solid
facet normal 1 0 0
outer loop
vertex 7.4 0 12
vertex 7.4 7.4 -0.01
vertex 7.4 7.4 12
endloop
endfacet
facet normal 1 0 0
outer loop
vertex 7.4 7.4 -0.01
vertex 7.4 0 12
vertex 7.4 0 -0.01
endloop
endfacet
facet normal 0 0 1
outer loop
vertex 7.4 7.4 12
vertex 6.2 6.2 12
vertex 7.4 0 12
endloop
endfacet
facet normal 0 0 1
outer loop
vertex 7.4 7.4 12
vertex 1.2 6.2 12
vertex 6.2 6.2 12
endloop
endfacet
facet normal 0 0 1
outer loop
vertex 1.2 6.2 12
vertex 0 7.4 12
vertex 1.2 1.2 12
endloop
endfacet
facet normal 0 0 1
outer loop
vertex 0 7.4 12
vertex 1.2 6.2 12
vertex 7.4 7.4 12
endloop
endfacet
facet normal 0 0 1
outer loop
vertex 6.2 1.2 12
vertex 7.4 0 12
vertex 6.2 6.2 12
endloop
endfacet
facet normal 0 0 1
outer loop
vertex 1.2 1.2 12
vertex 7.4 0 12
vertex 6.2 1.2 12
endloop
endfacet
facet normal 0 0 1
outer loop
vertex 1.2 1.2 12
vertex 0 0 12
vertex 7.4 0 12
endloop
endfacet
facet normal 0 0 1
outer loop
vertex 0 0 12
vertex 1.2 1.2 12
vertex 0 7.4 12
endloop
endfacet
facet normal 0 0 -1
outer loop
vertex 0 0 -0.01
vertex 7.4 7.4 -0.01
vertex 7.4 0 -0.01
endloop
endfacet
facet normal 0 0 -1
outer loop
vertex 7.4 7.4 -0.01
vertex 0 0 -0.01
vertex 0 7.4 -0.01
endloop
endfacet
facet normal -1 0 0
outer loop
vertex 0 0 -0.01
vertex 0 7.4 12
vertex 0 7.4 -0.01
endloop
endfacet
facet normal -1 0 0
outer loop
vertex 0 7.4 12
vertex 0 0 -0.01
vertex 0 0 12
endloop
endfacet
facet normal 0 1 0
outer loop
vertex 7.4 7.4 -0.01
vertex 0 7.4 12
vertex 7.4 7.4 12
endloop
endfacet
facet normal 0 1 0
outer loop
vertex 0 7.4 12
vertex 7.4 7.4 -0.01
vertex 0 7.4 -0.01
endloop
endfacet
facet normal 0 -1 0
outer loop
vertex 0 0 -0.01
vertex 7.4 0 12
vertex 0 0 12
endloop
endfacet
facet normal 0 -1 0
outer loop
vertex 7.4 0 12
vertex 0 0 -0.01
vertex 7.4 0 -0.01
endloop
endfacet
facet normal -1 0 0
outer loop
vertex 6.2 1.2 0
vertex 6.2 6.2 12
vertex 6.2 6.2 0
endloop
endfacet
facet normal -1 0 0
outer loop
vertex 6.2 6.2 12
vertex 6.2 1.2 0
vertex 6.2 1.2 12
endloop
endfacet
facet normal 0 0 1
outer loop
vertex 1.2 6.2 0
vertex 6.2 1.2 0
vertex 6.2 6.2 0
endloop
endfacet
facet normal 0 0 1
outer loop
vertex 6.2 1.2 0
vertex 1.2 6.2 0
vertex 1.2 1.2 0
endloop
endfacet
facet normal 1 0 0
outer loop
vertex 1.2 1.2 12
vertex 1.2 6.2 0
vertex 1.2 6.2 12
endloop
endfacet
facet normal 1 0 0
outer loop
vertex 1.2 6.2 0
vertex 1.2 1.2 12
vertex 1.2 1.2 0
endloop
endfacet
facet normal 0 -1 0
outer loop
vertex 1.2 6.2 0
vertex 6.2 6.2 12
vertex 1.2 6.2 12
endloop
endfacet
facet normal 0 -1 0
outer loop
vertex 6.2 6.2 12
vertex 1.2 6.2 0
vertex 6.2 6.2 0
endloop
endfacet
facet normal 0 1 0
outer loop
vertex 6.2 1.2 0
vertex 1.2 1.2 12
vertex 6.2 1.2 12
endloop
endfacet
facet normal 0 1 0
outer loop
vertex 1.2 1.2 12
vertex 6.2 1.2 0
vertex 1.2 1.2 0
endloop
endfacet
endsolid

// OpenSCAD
// file: ../Base/Rotation.scad
// Fischertechnik Box Foundation
// Geometry Helpers Rotation

include <PlacementOptions.scad>

// getRotatedSpace(space, rotation=NoRotation)
// Rotates the space dependent on the specified rotation

function getRotatedSpace(space, rotation=NoRotation) = [
    (rotation == Rotate90 || rotation == Rotate270) ? space.y : space.x,
    (rotation == Rotate90 || rotation == Rotate270) ? space.x : space.y
];

// Rotates the given space around the fixed left lower corner
// space = the space the children needs as width/depth list [width,depth]
// rotation = 0 Rotate0 degrees, 1 Rotate90 degrees, 2 Rotate180 degrees, 3 Rotate270 degrees (equivalent to -90)

module RotateFix(space, rotation=NoRotation) {
    dy = (rotation == Rotate0 || rotation == Rotate270) ? 0 :
        (rotation == Rotate90) ? space.x :
        space.y;
    dx = (rotation < Rotate180) ? 0 :
        (rotation == Rotate180) ? space.x :
        space.y;
    
    translate([dx, dy, 0])
        rotate([0, 0, rotations[rotation]])
            children();
}
// file: ../Base/Alignment.scad
// Fischertechnik Box Foundation
// Geometry Helpers Alignment

include <PlacementOptions.scad>

// getAlignedX(elementWidth, spaceWidth, align=AlignRight, offset=0)
// Gets the aligned X offset of an element with the given
// width in the given space.
// elementWidth = The width of the element to positon
// spaceWidth = The space where the element should be aligned
// align = 0 AlignLeft, 1 AlignCenter, 2 AlignRight
// offset = an optional offset from the aligned position. When
// aligned left or centered, then positive values are in X direction.
// When aligned right then positive values are in negative X direction.

function getAlignedX(elementWidth, spaceWidth, align=AlignRight, offset=0) =
    (align == AlignLeft) ?
        offset :
        ((align == AlignCenter) ?
        (spaceWidth - elementWidth)/2 + offset :
        spaceWidth - offset - elementWidth);

// getAlignedY(elementDepth, spaceDepth, align=AlignTop, offset=0)
// Gets the aligned Y offset of an element with the given
// depth in the given space.
// elementDepth = The depth of the element to positon
// spaceDepth = The space where the element should be aligned
// align = 0 AlignBottom, 1 AlignCenter, 2 AlignTop
// offset = an optional offset from the aligned position. When
// aligned bottom or centered, then positive values are in Y direction.
// When aligned top then positive values are in negative Y direction.

function getAlignedY(elementDepth, spaceDepth, align=AlignTop, offset=0) =
    (align == AlignBottom) ?
        offset :
        ((align == AlignCenter) ?
        (spaceDepth - elementDepth)/2 + offset :
        spaceDepth - offset - elementDepth);
// file: ../Base/PlacementOptions.scad
// Fischertechnik Box Foundation
// Placement Options

// Alignment
NoAlign = 0;
AlignLeft = 1;
AlignBottom = 2;
AlignCenter = 3;
AlignRight = 4;
AlignTop = 5;

// Element rotation degree steps
rotations = [0, -90, -180, -270];

// Rotation
NoRotation = 0;
Rotate0 = 0;
Rotate90 = 1;
Rotate180 = 2;
Rotate270 = 3;

// Docking (seen from above)
NoDock = -1;
DockLeft = 0;
DockTop = 1;
DockRight = 2;
DockCorner = 2;
DockBottom = 3;

// Web corners
LowerLeft = 0;
UpperLeft = 1;
UpperRight = 2;
LowerRight = 3;

// Web position relative to corner
LeftOfCorner = 0;
RightOfCorner = 1;
// file: ../Base/Boxes.scad
// Fischertechnik Box Foundation
// Pre-designed Boxes

use <Constants.scad>

include <PlacementOptions.scad>

box190Width = 190;
box190Depth = 130;
box130Width = 130;
box130Depth = 95;

// Values are from an original ec3 box
topBottomDifference = 1.5;
outerHeight = 40;
baseThickness = 1.8;
innerHeight = outerHeight - baseThickness;
stackExcess = 5.7;
radius = 3.5;
wallThickness = 1.5;
tolerance = 0.2;

boxWallThickness = wallThickness;
boxBaseThickness = baseThickness;
boxWebWidth = 3.0;

// getBoxWallThickness()
// Gets the wall thickness of a Fischertechnik Box
function getBoxWallThickness() = boxWallThickness;

// getBoxUsageHeight(height = 38.2)
// Gets the usable height of a Fischertechnik box
// height = Outer height of the box from the bottom to the upper edge.
function getBoxUsageHeight(height = outerHeight) = height - baseThickness - stackExcess;

// getBoxInnerHeight()
// Gets the inner height of a Fischertechnik box, including the stack excess
function getBoxInnerHeight() = innerHeight;

// getBoxBaseThickness()
// Gets the thickness of the Fischertechnik box base.
function getBoxBaseThickness() = boxBaseThickness;

// getBoxWebWidth()
// Gets the width of a box web
function getBoxWebWidth() = boxWebWidth;

// getBox190Space()
// Gets the usable inner space of a Box 190 as an x/y-list
function getBox190Space() = [
    box190Width - 2*getBoxWallThickness() - topBottomDifference, 
    box190Depth - 2*getBoxWallThickness() - topBottomDifference ];

// RoundedCornerPlate(width, depth, height, radius)
// Creates a body plate with rounded corners for a box. Used
// also to create the complete box with the hull module.
// width = Width of the plate
// depth = depth of the plate 
// height = thickness of the plate
// radius = radius of the rounded corner
module RoundedCornerPlate(width, depth, height, radius) {
    translate([radius, radius])
    hull() {
        w = width-2*radius;
        d = depth-2*radius;
        cube([w, d, height]);
        cylinder(height, r=radius, $fn=getFragments());
        translate([w, 0])
            cylinder(height, r=radius, $fn=getFragments());
        translate([w, d])
            cylinder(height, r=radius, $fn=getFragments());
        translate([0, d])
            cylinder(height, r=radius, $fn=getFragments());
    }
}

// BoxBase(width, depth)
// Creates an empty stackable Fischertechnik compatible box
// width = Outer width of the box (190, 130, ...)
// depth = Outer depth of the box (130, 95, ...)

module BoxBase(width, depth, height=outerHeight) {    
    thinPlate = 0.01;

    innerHeight = height - baseThickness;    
    
    module Body(tolerance=tolerance) {
        hull() {
            // Bottom with tolerance to fit into the original boxes when stacked
            translate([-wallThickness+tolerance, -wallThickness+tolerance, -baseThickness])
                RoundedCornerPlate(width-topBottomDifference-2*tolerance, depth-topBottomDifference-2*tolerance, thinPlate, radius);
            
            // Top
            translate([-wallThickness-topBottomDifference/2, -wallThickness-topBottomDifference/2, innerHeight-thinPlate])
                RoundedCornerPlate(width, depth, thinPlate, radius);
         }
    }

    module Cutoff() {
        hull() {
            coWidth = width - 2*wallThickness;
            coDepth = depth - 2*wallThickness;
            
            // Bottom
            RoundedCornerPlate(coWidth-topBottomDifference, coDepth-topBottomDifference, thinPlate, radius);

            // Top
            translate([-topBottomDifference/2, -topBottomDifference/2, innerHeight+thinPlate]) 
                RoundedCornerPlate(coWidth, coDepth, thinPlate, radius);
        }
    }
    
    difference() {        
        Body();
        Cutoff();
        stackOffset = innerHeight - stackExcess;
        translate([0, 0, stackOffset + baseThickness])
            Body(tolerance=0);
    }
}

// Creates the Fischertechnik empty box 130x190 mm and places it at position 0,0
// 190x130 are the outer sizes, the inner space is slightly smaller. Use getBox190Space() to get the inner sizes.
// The box is positioned that the usable inner space is at the 0,0,0 position.

module Box190() {
    BoxBase(box190Width, box190Depth);
}

// Gets the usable inner space of a Box 130 as an x/y-list
function getBox130Space() = [
    box130Width - 2*getBoxWallThickness() - topBottomDifference, 
    box130Depth - 2*getBoxWallThickness() - topBottomDifference ];

// Creates the Fischertechnik empty box 95x130 mm and places it at position 0,0
// 190x130 are the outer sizes, the inner space is slightly smaller. Use getBox190Space() to get the inner sizes.
// The box is positioned that the usable inner space is at the 0,0,0 position.

module Box130() {
    BoxBase(box130Width, box130Depth);
}

// Creates a web at the specified box walls
// corner 0 = LowerLeft, 1 = UpperLeft, 2 = UpperRight, 3 = LowerRight
// side 0 = LeftOfCorner, 1 = RightOfCorner
// distance = Distance in mm from the corner
// boxSpace = inner width and depth of the box (default: Box 190)
// webWidth = length of the web (default is 3 mms)
// webThickness = thickness of the web (default is 1 mm)
// height = Height of the web (standard is getBoxUsageHeight())
// sink = How much of the web is sunk into the wall

module BoxWeb(
    corner, 
    side, 
    distance, 
    boxSpace=getBox190Space(), 
    webWidth=getBoxWebWidth(), 
    webThickness=1.0, 
    height=getBoxUsageHeight(),
    sink = getBoxWallThickness()/2) {
    width = (corner % 2 == 0) ? 
            (side == LeftOfCorner ? webWidth : webThickness) :
            (side == LeftOfCorner ? webThickness : webWidth);

    depth = (corner % 2 == 0) ? 
            (side == RightOfCorner ? webWidth : webThickness) :
            (side == RightOfCorner ? webThickness : webWidth);
    
    xDiff = corner == LowerLeft ? 
                (side == LeftOfCorner ? -sink : distance) :
            (corner == UpperLeft ?                
                (side == LeftOfCorner ? distance : -sink) :
            (corner == UpperRight ?
                (side == LeftOfCorner ? boxSpace.x-webWidth+sink : boxSpace.x-distance-webThickness) :
                (side == LeftOfCorner ? boxSpace.x-distance-webThickness: boxSpace.x-webWidth+sink)));

    yDiff = corner == LowerLeft ? 
                (side == RightOfCorner ? -sink : distance) :
            (corner == UpperLeft ?
                (side == RightOfCorner ? boxSpace.y-distance-webThickness : boxSpace.y-webWidth+sink) :
            (corner == UpperRight ?
                (side == RightOfCorner ? boxSpace.y-webWidth+sink : boxSpace.y-distance-webThickness) :
                (side == RightOfCorner ? distance : -sink)));
    
    translate([xDiff, yDiff, -getExcess()])
        cube([width, depth, height + 2*getExcess()]);
}
// file: ../Base/Placement.scad
// Fischertechnik Box Foundation
// Geometry Helpers Placement

use <Constants.scad>
use <Alignment.scad>
use <Rotation.scad>
use <Boxes.scad>

include <PlacementOptions.scad>

// Place(x=0, y=0, elementSpace=[0,0], alignX=AlignLeft, alignY=AlignBottom, rotation=Rotate0, boxSpace=getBox190Space())
// Places the child at the specified position
// y = Y-Position. This is a relative position when an X aligment is specified.
// x = X-Position. This is a relative position when an Y aligment is specified.
// elementSpace = space of the element to be placed [x,y]
// alignX = -1=NoAlign, 0 AlignLeft, 1 AlignCenter, 3 AlignRight (elementSpace and boxSpace required!)
// alignY = -1=NoAlign, 2 AlignBottom, 1 AlignCenter, 4 AlignTop (elementSpace and boxSpace required!)
// rotation = 0 Rotate0 0 degrees, 1 Rotate90 90 degrees, 
// 2 Rotate180 180 degrees, 3 Rotate270 270 degrees (equivalent to -90)
// boxSpace = Inner space of the box where the placement occurs [x,y] - default is Box 190x130 inner space

module Place(x=0, y=0, elementSpace=[0,0], 
  alignX=AlignLeft, alignY=AlignBottom, 
  rotation=NoRotation, boxSpace=getBox190Space()) {

    module Position(x, y, space, rotation=Rotate0) {
        translate([x, y, 0])
            RotateFix(space, rotation)
                children();
    }

    space = getRotatedSpace(elementSpace, rotation);
    alignedX = getAlignedX(space.x, boxSpace.x, alignX, x);
    alignedY = getAlignedY(space.y, boxSpace.y, alignY, y);
    Position(alignedX, alignedY, elementSpace, rotation)
        children();
}

// Center(space=getBox130Space(), elementSpace=[0,0])
// space = Space where the children is centered. For cylinder use centered=true and no elementSpace.
// elementSpace = space of the element to be centered [x,y]

module Center(space=getBox190Space(), elementSpace=[0,0]) {
    Place(elementSpace=elementSpace, boxSpace=space, alignX=AlignCenter, alignY=AlignCenter)
        children();
}

// CenterHorizontal(width=0, y=0, offset=0, space=getBox130Space())
// width = Width of the element to be placed.
// y = Y position of the element
// offset = Offset from the center position (negative will be left of the center)
// space = Space where the element is placed

module CenterHorizontal(width=0, y=0, offset=0, space=getBox190Space()) {
    Place(x=offset, y=y, elementSpace=[width, 0], boxSpace=space, alignX=AlignCenter)
        children(0);
}

// CenterVertical(depth=0, x=0, offset=0, space=getBox130Space())
// depth = Depth of the element to be placed.
// x = X position of the element
// offset = Offset from the center position (negative will be down of the center)
// space = Space where the element is placed

module CenterVertical(depth=0, x=0, offset=0, space=getBox190Space()) {
    Place(x=x, y=offset, elementSpace=[0, depth], boxSpace=space, alignY=AlignCenter)
        children(0);
}

// getIsVertical(align)
// True if the specified alignment needs a vertical orientation for a divider (AlignRight, AlignLeft)

function getIsVertical(align) = (align == AlignRight || align == AlignLeft);

// getIsHorizontal(align)
// True if the specified alignment needs a horizontal orientation for a divider (AlignTop, AlignBottom)

function getIsHorizontal(align) = (align == AlignTop || align == AlignBottom);
// file: ../Base/Constants.scad
// Fischertechnik Box Foundation
// Constants

// Constant values necessary for multiple elements

// Base constants
dividerThickness = 1.2;
excess = 0.01;
fragments = 90;
tolerance = 0.8;

// Gets the thickness of a divider 
function getDividerThickness() = dividerThickness;

// Gets the excess that is used to merge walls into each other
function getExcess() = excess;

// Gets amount of fragments of a cylinder
function getFragments() = fragments;

// Gets the inner tolerance of a frame to each side
function getTolerance() = tolerance;


// Fischertechnik specific constants
axisDiameter = 4;
axisBottomDiameter = axisDiameter + 1;
axisTolerance = 0.2;

// Gets axis diameter of Fischertechnik axis
function getAxisDiameter() = axisDiameter;

// Gets axis diameter tolerance (subtracted for element axis)
function getAxisTolerance() = axisTolerance;

// Gets the axis diameter for standing axis
function getStandAxisDiameter() = getAxisDiameter() - getAxisTolerance();

// Gets axis bottom diameter for thicker part at the bottom
function getAxisBottomDiameter() = axisBottomDiameter;

pinHeight = 2.5;

// gets the height of a connecting pin
function getPinHeight() = pinHeight;

standardEdgeDistance = 2.5;
standardWebDistance = 11.5;
standardCornerLength = 15;

// gets the standard distance to the wall of the box for dockable frames with webs
function getStandardEdgeDistance() = standardEdgeDistance;

// gets the standard distance of each web to the corner of the dockable frame
function getStandardWebDistance() = standardWebDistance;

// gets the standard length of the corner walls of a dockable frame
function getStandardCornerLength() = standardCornerLength;

tubeWallFactor = 0.8;

// gets the wall thickness of a tube.
function getTubeWallThickness() = tubeWallFactor * getDividerThickness();

smallPartsFrameHeight = 20;

// gets the frame height for docked small parts boxes.
function getSmallPartsFrameHeight() = smallPartsFrameHeight;

hubRingDiameter = 19.5;
hubRingLevelDiameter = 21;

// gets the diameter of a tube matching the inner ring of a wheel
function getHubRingDiameter() = hubRingDiameter;

// gets the diameter of a hub tube with a thicker diameter
function getHubRingLevelDiameter() = hubRingLevelDiameter;
// main file
// Fischertechnik Box Library
// Frame for Control Light for electronic building block
// 36390

use <../Base/Constants.scad>
use <../ModelBase/Simple.scad>

/* [Hidden] */
width = 5;
depth = 5;
height = 12;

// getFrameControlLightSpace()
// Gets the space the frame for a control light needs as width and depth (.x and .y as a list)

function getFrameControlLightSpace() = getFrameOuterVolume([width, depth, height], tolerance=0);

// FrameControlLight()
// The walls of the frame are 12 mm high. 

module FrameControlLight() {
    Frame([width, depth, height], tolerance=0);
}

// Tests
color("lightgray") {
FrameControlLight();
}
